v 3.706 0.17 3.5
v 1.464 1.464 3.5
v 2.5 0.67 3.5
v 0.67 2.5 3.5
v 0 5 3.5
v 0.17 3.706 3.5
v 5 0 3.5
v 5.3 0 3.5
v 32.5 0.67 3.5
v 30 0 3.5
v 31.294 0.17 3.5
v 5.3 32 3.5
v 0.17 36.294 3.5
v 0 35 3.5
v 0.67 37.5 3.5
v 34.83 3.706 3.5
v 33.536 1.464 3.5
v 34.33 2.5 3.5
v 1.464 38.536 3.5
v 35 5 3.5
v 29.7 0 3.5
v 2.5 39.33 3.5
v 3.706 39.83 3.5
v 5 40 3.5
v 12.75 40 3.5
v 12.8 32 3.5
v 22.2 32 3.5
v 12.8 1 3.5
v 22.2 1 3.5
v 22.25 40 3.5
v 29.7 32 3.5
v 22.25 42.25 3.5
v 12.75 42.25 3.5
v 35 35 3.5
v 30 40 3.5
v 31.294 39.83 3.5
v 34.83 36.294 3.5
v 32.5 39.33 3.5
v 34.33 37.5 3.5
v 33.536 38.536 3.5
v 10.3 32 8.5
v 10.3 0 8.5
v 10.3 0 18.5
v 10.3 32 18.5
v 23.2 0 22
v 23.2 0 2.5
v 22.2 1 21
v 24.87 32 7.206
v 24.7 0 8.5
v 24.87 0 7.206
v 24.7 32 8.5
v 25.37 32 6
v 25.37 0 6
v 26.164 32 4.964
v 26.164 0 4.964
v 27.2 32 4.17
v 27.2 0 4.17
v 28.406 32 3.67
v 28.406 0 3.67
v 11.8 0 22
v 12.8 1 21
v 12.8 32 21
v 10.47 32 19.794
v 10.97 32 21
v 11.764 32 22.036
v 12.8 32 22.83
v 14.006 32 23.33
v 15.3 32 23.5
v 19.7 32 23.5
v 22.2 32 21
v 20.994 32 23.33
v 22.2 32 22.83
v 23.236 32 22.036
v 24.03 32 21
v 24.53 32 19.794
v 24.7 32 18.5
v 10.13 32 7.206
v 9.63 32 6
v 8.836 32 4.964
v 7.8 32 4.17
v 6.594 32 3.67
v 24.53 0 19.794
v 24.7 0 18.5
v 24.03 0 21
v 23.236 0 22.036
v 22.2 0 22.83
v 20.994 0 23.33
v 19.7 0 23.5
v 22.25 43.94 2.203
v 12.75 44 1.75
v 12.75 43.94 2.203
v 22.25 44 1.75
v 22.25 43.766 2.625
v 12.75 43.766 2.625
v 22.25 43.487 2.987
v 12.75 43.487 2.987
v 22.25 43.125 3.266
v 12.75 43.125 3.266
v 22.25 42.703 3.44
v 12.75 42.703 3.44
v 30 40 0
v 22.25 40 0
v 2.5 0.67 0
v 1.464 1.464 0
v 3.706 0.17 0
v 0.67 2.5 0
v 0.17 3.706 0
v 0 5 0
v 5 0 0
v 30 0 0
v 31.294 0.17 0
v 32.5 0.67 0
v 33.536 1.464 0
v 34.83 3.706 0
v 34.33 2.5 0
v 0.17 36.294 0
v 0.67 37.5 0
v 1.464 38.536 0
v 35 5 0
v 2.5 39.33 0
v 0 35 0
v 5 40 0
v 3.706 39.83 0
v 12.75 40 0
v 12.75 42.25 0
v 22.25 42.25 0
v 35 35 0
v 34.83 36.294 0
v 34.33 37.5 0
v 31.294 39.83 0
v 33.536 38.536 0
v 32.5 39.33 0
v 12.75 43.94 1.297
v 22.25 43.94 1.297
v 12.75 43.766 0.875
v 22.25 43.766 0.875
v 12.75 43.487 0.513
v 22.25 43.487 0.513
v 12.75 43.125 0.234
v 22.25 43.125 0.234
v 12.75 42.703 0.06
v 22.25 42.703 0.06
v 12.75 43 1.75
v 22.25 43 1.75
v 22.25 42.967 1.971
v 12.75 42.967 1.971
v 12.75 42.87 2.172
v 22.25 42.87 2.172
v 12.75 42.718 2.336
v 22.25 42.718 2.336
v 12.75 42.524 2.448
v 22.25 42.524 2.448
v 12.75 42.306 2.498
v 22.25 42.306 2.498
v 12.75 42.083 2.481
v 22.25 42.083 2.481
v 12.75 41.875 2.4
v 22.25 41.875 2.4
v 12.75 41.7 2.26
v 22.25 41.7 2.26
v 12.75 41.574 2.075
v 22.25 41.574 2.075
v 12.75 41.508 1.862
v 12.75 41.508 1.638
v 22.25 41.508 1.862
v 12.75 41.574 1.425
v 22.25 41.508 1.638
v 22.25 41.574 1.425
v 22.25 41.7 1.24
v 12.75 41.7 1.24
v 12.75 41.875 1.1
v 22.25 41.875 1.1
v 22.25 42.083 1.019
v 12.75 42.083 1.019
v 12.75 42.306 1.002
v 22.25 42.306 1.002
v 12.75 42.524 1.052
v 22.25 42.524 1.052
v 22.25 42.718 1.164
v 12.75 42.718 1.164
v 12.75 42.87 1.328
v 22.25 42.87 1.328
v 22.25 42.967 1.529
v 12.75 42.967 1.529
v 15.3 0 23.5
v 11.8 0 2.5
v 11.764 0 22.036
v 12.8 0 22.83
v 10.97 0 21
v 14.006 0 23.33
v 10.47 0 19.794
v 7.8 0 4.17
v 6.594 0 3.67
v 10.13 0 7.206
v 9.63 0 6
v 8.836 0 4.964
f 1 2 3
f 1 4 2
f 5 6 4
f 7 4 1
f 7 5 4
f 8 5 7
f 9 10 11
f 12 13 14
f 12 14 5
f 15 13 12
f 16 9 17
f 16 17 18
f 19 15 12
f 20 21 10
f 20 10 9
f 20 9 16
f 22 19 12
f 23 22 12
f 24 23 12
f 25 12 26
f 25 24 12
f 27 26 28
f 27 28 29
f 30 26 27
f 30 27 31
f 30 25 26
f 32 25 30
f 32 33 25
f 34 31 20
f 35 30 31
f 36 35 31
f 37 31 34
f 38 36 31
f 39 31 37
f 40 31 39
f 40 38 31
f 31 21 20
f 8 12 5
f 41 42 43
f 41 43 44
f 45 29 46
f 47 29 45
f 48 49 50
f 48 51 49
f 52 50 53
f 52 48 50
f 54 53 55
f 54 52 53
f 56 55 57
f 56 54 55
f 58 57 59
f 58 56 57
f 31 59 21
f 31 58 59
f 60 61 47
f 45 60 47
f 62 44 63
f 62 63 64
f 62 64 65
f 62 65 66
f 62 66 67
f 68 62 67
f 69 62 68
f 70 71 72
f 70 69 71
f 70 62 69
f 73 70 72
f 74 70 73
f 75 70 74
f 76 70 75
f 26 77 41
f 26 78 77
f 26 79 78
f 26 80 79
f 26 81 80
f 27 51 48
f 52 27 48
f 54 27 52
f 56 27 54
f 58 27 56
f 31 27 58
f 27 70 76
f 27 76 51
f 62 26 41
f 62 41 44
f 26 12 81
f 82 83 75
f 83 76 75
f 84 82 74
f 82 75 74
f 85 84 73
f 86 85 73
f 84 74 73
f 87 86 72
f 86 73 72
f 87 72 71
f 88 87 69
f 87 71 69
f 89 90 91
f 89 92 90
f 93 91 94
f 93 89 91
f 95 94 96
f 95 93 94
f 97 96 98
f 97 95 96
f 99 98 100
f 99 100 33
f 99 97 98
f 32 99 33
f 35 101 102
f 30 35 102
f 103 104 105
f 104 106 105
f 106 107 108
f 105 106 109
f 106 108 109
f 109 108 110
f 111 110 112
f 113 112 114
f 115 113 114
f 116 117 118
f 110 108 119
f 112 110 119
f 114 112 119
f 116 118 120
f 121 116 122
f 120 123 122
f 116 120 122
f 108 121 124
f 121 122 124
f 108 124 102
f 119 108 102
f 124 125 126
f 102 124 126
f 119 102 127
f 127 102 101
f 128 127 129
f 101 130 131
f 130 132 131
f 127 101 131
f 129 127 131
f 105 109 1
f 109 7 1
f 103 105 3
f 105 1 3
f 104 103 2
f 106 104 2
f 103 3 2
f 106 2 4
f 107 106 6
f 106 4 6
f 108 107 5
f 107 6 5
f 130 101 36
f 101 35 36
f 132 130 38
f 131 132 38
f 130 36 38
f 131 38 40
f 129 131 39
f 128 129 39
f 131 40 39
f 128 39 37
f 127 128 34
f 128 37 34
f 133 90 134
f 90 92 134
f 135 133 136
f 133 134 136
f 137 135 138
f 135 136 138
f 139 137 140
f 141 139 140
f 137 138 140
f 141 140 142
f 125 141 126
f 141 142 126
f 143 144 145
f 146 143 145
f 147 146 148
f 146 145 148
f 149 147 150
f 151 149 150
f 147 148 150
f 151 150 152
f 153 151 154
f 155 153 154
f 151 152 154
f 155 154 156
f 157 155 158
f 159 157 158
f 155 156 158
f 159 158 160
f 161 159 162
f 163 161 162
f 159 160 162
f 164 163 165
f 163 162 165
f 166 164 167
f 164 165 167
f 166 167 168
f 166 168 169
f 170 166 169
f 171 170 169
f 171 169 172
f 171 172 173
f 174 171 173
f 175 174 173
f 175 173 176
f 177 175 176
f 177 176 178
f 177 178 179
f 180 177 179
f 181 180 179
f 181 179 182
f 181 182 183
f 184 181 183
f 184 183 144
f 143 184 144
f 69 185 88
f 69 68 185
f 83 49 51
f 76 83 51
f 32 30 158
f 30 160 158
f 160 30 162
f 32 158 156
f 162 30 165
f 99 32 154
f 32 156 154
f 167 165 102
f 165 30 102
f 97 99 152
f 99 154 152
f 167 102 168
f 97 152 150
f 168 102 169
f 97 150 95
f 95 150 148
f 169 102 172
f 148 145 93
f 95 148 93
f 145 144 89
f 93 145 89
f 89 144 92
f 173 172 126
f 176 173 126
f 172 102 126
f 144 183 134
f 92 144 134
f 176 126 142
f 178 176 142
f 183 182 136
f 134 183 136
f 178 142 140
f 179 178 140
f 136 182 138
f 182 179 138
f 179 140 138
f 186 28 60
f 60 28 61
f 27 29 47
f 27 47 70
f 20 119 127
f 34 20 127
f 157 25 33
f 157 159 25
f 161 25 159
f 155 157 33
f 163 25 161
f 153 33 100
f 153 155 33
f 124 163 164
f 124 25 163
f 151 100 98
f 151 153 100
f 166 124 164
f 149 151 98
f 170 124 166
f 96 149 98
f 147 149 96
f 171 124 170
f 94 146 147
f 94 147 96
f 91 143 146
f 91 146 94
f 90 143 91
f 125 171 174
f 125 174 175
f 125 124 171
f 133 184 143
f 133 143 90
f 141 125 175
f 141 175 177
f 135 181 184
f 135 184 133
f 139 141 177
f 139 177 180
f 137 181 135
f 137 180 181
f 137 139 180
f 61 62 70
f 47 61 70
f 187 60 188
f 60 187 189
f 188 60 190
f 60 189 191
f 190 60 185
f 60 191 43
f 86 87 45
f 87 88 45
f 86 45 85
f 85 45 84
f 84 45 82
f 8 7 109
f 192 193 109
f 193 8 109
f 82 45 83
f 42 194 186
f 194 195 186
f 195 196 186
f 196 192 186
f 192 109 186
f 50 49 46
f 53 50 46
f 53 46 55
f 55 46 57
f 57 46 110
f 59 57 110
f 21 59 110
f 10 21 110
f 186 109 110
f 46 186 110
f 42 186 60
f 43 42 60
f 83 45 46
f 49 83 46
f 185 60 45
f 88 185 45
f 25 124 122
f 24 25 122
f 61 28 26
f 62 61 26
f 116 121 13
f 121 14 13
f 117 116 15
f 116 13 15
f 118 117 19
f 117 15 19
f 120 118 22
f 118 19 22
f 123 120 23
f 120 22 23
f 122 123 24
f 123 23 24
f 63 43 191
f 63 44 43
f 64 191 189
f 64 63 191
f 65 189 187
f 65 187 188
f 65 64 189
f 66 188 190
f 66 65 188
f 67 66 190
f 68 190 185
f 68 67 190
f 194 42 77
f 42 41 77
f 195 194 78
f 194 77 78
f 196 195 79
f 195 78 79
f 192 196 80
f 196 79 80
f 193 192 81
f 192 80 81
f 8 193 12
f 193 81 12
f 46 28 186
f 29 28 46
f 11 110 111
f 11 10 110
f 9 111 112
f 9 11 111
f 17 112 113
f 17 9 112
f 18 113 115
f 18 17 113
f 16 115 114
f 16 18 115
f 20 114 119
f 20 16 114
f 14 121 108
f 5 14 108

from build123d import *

# Parameters (mm, degrees)
F0_W     = 9.5
F0_H     = 4
F1_DEPTH = 3.5
F2_R     = 1.74999
F3_R     = 0.75
F4_DEPTH = 10
F5_W     = 2.5
F5_H     = 32
F6_DEPTH = 17.5
F7_W     = 14.4
F7_H     = 32
F8_DEPTH = 2.5
F9_R     = 5
F10_SIZE = 1


# Not quite as in the source:
# - a fillet or chamfer is up to 0.001 mm smaller than in the source, because OpenCascade refuses the exact size


with BuildPart() as f1:
    # F0 (on Top) → F1 (new body)
    with BuildSketch(Plane.XY):
        Polygon((0, 40), (0, 0), (35, 0), (35, 40), (22.25, 40), (12.75, 40), align=None)
        with Locations((17.5, 42)):
            Rectangle(F0_W, F0_H)
    extrude(amount=F1_DEPTH)

    # F2 (radius 1.75 in the source; OpenCascade refuses exactly that, so slightly less here)
    f2_edges = [f1.edges().sort_by_distance(p)[0] for p in [
        (17.5, 44, 3.5),
        (17.5, 44, 0),
    ]]
    fillet(f2_edges, radius=F2_R)

    # F3 (on face) → F4 (cut)
    with BuildSketch(Plane.YZ.offset(22.25)):
        with Locations((42.25, 1.75)):
            Circle(F3_R)
    extrude(amount=-F4_DEPTH, mode=Mode.SUBTRACT)

    # F5 (on face) → F6 (join)
    with BuildSketch(Plane.XY.offset(3.5)):
        with Locations((11.55, 16)):
            Rectangle(F5_W, F5_H)
        with Locations((23.45, 16)):
            Rectangle(F5_W, F5_H)
    extrude(amount=F6_DEPTH)

    # F7 (on face) → F8 (join)
    with BuildSketch(Plane.XY.offset(21)):
        with Locations((17.5, 16)):
            Rectangle(F7_W, F7_H)
    extrude(amount=F8_DEPTH)

    # F9
    f9_edges = [f1.edges().sort_by_distance(p)[0] for p in [
        (24.7, 16, 23.5),
        (10.3, 16, 23.5),
        (24.7, 16, 3.5),
        (10.3, 16, 3.5),
        (35, 40, 1.75),
        (0, 40, 1.75),
        (0, 0, 1.75),
        (35, 0, 1.75),
    ]]
    fillet(f9_edges, radius=F9_R)

    # F10
    f10_edges = [f1.edges().sort_by_distance(p)[0] for p in [
        (12.8, 0, 12.25),
        (17.5, 0, 3.5),
        (22.2, 0, 12.25),
        (17.5, 0, 21),
    ]]
    chamfer(f10_edges, length=F10_SIZE)


solid = f1.part
